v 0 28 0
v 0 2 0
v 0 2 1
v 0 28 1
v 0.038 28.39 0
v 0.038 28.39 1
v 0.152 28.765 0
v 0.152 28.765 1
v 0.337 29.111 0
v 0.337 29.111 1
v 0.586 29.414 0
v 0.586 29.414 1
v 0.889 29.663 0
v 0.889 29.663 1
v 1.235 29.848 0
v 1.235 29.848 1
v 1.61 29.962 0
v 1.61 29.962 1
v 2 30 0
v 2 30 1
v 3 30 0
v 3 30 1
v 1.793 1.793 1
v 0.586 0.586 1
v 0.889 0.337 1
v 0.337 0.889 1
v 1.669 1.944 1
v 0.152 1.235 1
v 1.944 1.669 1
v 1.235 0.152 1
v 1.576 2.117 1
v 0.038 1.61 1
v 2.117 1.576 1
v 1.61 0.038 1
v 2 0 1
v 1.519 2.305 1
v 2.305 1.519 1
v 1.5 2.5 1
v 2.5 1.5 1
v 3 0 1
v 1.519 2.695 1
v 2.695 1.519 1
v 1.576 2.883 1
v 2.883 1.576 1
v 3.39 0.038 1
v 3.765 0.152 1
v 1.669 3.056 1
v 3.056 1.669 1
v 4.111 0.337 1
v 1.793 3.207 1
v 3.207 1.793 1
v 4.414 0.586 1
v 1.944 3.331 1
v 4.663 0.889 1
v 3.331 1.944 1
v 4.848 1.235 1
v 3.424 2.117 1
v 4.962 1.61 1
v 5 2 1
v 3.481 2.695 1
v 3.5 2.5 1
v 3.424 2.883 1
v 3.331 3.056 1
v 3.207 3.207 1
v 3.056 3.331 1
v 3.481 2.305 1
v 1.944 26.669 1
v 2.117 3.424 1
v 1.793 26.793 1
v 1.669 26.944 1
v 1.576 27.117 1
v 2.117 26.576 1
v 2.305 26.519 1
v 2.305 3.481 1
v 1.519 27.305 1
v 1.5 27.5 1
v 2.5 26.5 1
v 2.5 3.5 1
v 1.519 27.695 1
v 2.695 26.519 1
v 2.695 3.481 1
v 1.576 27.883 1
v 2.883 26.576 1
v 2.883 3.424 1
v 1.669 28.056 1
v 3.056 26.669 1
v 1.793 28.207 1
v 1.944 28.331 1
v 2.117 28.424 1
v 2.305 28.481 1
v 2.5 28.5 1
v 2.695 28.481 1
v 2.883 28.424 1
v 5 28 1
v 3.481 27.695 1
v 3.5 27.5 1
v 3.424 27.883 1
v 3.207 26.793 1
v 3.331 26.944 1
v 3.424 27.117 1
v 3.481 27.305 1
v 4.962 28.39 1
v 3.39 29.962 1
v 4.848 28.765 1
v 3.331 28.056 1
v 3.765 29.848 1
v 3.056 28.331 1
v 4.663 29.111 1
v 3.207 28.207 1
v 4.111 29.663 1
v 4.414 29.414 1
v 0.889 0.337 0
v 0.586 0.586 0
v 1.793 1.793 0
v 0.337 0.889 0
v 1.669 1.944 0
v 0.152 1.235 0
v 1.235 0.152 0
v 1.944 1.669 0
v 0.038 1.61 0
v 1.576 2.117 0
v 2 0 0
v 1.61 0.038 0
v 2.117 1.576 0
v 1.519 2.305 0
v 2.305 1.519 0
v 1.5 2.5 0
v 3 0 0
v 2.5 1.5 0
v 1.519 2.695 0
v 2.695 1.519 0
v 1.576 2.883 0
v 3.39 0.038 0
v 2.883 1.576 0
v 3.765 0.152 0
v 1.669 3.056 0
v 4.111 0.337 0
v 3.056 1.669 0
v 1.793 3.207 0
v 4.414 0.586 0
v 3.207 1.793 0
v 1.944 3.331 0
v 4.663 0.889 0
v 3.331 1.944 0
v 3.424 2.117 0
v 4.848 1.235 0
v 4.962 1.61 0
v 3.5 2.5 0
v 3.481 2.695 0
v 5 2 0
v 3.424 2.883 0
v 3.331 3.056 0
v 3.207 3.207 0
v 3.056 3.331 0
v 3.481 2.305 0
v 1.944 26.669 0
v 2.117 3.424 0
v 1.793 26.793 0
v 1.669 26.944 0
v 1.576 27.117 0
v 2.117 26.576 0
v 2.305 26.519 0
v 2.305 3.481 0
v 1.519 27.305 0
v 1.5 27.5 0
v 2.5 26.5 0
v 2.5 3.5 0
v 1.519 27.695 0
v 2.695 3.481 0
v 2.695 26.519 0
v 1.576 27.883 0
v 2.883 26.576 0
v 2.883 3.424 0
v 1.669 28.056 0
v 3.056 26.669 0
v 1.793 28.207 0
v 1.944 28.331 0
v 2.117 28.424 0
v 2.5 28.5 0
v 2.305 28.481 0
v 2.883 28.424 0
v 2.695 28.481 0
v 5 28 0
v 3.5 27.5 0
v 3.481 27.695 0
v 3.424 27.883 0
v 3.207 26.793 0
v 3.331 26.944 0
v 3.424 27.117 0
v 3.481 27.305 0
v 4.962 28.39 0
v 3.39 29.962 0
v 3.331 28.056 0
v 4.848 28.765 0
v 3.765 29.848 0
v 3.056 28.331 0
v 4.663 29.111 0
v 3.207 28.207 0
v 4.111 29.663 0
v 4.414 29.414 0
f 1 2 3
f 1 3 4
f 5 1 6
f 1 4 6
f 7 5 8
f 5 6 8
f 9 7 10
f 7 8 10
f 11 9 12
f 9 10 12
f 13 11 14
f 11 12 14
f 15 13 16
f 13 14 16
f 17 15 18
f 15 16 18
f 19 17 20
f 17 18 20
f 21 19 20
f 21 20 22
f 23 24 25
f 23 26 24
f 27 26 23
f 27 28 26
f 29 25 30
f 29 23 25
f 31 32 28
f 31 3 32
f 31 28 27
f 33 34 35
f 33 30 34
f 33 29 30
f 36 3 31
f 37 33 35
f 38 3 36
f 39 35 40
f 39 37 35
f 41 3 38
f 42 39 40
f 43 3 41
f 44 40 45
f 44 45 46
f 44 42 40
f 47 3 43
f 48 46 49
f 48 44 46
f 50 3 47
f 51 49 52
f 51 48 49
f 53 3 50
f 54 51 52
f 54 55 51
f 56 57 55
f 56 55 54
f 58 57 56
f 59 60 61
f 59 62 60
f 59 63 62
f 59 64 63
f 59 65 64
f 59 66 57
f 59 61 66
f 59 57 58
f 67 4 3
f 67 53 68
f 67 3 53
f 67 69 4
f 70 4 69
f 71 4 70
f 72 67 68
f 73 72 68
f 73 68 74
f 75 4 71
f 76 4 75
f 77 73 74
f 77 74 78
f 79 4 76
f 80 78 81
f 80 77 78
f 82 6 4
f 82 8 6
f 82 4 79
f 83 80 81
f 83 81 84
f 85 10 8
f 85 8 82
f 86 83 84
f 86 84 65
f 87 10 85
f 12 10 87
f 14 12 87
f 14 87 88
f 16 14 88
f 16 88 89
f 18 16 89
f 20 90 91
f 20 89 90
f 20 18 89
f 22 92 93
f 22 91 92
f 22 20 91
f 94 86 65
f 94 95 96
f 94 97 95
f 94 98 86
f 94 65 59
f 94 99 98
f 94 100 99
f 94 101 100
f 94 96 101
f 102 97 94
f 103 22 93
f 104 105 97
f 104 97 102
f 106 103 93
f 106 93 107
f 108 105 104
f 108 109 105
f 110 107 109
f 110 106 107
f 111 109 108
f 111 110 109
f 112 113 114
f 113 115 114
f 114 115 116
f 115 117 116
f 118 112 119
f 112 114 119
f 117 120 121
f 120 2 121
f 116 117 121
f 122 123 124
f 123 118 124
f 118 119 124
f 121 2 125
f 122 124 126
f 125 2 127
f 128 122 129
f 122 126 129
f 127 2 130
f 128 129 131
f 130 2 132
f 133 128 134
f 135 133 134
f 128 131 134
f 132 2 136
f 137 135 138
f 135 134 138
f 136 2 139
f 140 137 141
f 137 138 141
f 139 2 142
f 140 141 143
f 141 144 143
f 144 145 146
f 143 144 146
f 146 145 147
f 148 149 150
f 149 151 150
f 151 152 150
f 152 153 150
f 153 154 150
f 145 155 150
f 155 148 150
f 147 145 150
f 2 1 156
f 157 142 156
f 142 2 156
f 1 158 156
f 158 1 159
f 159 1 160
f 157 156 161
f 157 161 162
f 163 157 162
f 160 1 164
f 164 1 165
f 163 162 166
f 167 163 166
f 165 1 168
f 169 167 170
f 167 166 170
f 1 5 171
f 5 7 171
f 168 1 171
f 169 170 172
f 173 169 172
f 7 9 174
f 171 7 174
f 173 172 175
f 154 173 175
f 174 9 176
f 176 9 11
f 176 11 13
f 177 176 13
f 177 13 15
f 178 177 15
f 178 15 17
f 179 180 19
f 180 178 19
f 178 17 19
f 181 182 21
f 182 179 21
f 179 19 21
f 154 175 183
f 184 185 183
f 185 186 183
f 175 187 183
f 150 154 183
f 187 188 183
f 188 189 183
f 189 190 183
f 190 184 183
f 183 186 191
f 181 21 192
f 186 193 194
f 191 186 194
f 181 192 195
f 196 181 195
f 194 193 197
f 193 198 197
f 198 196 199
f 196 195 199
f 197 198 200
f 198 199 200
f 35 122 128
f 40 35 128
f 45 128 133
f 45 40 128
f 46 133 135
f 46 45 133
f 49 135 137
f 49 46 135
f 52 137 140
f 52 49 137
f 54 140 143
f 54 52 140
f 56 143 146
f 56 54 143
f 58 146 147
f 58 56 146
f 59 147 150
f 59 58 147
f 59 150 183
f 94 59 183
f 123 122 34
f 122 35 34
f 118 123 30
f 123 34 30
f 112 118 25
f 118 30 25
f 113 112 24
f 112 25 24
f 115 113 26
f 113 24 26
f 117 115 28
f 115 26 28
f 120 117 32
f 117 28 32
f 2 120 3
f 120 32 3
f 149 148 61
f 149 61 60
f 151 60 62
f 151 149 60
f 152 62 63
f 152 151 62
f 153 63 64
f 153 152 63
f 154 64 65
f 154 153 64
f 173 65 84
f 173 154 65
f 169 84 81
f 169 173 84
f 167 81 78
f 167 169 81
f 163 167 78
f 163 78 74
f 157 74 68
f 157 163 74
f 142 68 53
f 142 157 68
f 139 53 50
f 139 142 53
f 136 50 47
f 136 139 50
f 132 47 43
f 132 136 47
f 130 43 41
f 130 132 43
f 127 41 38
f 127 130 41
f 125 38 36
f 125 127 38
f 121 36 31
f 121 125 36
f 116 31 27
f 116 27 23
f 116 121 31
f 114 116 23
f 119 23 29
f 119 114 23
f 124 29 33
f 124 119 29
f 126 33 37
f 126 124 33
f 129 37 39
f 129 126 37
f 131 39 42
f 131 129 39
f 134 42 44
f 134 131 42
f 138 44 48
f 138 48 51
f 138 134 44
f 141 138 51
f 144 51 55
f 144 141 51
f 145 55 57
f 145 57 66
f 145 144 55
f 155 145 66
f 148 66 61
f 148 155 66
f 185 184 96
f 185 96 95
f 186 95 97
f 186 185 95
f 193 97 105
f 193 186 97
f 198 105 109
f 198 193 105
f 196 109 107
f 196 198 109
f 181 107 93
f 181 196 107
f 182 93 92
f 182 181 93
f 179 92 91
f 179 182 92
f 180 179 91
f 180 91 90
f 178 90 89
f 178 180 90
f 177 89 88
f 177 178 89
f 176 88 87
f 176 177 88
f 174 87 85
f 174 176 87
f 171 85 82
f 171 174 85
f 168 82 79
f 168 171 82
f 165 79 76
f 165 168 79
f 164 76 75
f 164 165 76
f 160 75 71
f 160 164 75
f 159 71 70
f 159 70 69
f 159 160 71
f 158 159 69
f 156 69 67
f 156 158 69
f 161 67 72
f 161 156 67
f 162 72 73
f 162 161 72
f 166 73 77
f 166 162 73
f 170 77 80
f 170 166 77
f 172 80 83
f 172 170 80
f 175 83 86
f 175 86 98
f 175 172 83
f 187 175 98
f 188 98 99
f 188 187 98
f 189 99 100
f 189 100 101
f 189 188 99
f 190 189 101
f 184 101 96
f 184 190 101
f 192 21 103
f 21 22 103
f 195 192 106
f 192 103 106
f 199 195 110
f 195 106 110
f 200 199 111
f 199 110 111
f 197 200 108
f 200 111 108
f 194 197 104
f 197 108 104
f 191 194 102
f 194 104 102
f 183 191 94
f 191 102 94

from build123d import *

# Parameters (mm, degrees)
SKETCH1_W           = 5
SKETCH1_H           = 30
SKETCH1_R           = 1
BOSS_EXTRUDE1_DEPTH = 1
FILLET5_R           = 2
FILLET6_R           = 2
FILLET7_R           = 2
FILLET8_R           = 2


with BuildPart() as part:
    # Sketch1 → Boss-Extrude1 (new body)
    with BuildSketch(Plane.XY):
        with Locations((2.5, 15)):
            Rectangle(SKETCH1_W, SKETCH1_H)
        with Locations((2.5, 2.5)):
            Circle(SKETCH1_R, mode=Mode.SUBTRACT)
        with Locations((2.5, 27.5)):
            Circle(SKETCH1_R, mode=Mode.SUBTRACT)
    extrude(amount=BOSS_EXTRUDE1_DEPTH)

    # Fillet5
    fillet5_edges = [part.edges().sort_by_distance(p)[0] for p in [
        (5, 0, 0.5),
    ]]
    fillet(fillet5_edges, radius=FILLET5_R)

    # Fillet6
    fillet6_edges = [part.edges().sort_by_distance(p)[0] for p in [
        (0, 0, 0.5),
    ]]
    fillet(fillet6_edges, radius=FILLET6_R)

    # Fillet7
    fillet7_edges = [part.edges().sort_by_distance(p)[0] for p in [
        (0, 30, 0.5),
    ]]
    fillet(fillet7_edges, radius=FILLET7_R)

    # Fillet8
    fillet8_edges = [part.edges().sort_by_distance(p)[0] for p in [
        (5, 30, 0.5),
    ]]
    fillet(fillet8_edges, radius=FILLET8_R)


solid = part.part
